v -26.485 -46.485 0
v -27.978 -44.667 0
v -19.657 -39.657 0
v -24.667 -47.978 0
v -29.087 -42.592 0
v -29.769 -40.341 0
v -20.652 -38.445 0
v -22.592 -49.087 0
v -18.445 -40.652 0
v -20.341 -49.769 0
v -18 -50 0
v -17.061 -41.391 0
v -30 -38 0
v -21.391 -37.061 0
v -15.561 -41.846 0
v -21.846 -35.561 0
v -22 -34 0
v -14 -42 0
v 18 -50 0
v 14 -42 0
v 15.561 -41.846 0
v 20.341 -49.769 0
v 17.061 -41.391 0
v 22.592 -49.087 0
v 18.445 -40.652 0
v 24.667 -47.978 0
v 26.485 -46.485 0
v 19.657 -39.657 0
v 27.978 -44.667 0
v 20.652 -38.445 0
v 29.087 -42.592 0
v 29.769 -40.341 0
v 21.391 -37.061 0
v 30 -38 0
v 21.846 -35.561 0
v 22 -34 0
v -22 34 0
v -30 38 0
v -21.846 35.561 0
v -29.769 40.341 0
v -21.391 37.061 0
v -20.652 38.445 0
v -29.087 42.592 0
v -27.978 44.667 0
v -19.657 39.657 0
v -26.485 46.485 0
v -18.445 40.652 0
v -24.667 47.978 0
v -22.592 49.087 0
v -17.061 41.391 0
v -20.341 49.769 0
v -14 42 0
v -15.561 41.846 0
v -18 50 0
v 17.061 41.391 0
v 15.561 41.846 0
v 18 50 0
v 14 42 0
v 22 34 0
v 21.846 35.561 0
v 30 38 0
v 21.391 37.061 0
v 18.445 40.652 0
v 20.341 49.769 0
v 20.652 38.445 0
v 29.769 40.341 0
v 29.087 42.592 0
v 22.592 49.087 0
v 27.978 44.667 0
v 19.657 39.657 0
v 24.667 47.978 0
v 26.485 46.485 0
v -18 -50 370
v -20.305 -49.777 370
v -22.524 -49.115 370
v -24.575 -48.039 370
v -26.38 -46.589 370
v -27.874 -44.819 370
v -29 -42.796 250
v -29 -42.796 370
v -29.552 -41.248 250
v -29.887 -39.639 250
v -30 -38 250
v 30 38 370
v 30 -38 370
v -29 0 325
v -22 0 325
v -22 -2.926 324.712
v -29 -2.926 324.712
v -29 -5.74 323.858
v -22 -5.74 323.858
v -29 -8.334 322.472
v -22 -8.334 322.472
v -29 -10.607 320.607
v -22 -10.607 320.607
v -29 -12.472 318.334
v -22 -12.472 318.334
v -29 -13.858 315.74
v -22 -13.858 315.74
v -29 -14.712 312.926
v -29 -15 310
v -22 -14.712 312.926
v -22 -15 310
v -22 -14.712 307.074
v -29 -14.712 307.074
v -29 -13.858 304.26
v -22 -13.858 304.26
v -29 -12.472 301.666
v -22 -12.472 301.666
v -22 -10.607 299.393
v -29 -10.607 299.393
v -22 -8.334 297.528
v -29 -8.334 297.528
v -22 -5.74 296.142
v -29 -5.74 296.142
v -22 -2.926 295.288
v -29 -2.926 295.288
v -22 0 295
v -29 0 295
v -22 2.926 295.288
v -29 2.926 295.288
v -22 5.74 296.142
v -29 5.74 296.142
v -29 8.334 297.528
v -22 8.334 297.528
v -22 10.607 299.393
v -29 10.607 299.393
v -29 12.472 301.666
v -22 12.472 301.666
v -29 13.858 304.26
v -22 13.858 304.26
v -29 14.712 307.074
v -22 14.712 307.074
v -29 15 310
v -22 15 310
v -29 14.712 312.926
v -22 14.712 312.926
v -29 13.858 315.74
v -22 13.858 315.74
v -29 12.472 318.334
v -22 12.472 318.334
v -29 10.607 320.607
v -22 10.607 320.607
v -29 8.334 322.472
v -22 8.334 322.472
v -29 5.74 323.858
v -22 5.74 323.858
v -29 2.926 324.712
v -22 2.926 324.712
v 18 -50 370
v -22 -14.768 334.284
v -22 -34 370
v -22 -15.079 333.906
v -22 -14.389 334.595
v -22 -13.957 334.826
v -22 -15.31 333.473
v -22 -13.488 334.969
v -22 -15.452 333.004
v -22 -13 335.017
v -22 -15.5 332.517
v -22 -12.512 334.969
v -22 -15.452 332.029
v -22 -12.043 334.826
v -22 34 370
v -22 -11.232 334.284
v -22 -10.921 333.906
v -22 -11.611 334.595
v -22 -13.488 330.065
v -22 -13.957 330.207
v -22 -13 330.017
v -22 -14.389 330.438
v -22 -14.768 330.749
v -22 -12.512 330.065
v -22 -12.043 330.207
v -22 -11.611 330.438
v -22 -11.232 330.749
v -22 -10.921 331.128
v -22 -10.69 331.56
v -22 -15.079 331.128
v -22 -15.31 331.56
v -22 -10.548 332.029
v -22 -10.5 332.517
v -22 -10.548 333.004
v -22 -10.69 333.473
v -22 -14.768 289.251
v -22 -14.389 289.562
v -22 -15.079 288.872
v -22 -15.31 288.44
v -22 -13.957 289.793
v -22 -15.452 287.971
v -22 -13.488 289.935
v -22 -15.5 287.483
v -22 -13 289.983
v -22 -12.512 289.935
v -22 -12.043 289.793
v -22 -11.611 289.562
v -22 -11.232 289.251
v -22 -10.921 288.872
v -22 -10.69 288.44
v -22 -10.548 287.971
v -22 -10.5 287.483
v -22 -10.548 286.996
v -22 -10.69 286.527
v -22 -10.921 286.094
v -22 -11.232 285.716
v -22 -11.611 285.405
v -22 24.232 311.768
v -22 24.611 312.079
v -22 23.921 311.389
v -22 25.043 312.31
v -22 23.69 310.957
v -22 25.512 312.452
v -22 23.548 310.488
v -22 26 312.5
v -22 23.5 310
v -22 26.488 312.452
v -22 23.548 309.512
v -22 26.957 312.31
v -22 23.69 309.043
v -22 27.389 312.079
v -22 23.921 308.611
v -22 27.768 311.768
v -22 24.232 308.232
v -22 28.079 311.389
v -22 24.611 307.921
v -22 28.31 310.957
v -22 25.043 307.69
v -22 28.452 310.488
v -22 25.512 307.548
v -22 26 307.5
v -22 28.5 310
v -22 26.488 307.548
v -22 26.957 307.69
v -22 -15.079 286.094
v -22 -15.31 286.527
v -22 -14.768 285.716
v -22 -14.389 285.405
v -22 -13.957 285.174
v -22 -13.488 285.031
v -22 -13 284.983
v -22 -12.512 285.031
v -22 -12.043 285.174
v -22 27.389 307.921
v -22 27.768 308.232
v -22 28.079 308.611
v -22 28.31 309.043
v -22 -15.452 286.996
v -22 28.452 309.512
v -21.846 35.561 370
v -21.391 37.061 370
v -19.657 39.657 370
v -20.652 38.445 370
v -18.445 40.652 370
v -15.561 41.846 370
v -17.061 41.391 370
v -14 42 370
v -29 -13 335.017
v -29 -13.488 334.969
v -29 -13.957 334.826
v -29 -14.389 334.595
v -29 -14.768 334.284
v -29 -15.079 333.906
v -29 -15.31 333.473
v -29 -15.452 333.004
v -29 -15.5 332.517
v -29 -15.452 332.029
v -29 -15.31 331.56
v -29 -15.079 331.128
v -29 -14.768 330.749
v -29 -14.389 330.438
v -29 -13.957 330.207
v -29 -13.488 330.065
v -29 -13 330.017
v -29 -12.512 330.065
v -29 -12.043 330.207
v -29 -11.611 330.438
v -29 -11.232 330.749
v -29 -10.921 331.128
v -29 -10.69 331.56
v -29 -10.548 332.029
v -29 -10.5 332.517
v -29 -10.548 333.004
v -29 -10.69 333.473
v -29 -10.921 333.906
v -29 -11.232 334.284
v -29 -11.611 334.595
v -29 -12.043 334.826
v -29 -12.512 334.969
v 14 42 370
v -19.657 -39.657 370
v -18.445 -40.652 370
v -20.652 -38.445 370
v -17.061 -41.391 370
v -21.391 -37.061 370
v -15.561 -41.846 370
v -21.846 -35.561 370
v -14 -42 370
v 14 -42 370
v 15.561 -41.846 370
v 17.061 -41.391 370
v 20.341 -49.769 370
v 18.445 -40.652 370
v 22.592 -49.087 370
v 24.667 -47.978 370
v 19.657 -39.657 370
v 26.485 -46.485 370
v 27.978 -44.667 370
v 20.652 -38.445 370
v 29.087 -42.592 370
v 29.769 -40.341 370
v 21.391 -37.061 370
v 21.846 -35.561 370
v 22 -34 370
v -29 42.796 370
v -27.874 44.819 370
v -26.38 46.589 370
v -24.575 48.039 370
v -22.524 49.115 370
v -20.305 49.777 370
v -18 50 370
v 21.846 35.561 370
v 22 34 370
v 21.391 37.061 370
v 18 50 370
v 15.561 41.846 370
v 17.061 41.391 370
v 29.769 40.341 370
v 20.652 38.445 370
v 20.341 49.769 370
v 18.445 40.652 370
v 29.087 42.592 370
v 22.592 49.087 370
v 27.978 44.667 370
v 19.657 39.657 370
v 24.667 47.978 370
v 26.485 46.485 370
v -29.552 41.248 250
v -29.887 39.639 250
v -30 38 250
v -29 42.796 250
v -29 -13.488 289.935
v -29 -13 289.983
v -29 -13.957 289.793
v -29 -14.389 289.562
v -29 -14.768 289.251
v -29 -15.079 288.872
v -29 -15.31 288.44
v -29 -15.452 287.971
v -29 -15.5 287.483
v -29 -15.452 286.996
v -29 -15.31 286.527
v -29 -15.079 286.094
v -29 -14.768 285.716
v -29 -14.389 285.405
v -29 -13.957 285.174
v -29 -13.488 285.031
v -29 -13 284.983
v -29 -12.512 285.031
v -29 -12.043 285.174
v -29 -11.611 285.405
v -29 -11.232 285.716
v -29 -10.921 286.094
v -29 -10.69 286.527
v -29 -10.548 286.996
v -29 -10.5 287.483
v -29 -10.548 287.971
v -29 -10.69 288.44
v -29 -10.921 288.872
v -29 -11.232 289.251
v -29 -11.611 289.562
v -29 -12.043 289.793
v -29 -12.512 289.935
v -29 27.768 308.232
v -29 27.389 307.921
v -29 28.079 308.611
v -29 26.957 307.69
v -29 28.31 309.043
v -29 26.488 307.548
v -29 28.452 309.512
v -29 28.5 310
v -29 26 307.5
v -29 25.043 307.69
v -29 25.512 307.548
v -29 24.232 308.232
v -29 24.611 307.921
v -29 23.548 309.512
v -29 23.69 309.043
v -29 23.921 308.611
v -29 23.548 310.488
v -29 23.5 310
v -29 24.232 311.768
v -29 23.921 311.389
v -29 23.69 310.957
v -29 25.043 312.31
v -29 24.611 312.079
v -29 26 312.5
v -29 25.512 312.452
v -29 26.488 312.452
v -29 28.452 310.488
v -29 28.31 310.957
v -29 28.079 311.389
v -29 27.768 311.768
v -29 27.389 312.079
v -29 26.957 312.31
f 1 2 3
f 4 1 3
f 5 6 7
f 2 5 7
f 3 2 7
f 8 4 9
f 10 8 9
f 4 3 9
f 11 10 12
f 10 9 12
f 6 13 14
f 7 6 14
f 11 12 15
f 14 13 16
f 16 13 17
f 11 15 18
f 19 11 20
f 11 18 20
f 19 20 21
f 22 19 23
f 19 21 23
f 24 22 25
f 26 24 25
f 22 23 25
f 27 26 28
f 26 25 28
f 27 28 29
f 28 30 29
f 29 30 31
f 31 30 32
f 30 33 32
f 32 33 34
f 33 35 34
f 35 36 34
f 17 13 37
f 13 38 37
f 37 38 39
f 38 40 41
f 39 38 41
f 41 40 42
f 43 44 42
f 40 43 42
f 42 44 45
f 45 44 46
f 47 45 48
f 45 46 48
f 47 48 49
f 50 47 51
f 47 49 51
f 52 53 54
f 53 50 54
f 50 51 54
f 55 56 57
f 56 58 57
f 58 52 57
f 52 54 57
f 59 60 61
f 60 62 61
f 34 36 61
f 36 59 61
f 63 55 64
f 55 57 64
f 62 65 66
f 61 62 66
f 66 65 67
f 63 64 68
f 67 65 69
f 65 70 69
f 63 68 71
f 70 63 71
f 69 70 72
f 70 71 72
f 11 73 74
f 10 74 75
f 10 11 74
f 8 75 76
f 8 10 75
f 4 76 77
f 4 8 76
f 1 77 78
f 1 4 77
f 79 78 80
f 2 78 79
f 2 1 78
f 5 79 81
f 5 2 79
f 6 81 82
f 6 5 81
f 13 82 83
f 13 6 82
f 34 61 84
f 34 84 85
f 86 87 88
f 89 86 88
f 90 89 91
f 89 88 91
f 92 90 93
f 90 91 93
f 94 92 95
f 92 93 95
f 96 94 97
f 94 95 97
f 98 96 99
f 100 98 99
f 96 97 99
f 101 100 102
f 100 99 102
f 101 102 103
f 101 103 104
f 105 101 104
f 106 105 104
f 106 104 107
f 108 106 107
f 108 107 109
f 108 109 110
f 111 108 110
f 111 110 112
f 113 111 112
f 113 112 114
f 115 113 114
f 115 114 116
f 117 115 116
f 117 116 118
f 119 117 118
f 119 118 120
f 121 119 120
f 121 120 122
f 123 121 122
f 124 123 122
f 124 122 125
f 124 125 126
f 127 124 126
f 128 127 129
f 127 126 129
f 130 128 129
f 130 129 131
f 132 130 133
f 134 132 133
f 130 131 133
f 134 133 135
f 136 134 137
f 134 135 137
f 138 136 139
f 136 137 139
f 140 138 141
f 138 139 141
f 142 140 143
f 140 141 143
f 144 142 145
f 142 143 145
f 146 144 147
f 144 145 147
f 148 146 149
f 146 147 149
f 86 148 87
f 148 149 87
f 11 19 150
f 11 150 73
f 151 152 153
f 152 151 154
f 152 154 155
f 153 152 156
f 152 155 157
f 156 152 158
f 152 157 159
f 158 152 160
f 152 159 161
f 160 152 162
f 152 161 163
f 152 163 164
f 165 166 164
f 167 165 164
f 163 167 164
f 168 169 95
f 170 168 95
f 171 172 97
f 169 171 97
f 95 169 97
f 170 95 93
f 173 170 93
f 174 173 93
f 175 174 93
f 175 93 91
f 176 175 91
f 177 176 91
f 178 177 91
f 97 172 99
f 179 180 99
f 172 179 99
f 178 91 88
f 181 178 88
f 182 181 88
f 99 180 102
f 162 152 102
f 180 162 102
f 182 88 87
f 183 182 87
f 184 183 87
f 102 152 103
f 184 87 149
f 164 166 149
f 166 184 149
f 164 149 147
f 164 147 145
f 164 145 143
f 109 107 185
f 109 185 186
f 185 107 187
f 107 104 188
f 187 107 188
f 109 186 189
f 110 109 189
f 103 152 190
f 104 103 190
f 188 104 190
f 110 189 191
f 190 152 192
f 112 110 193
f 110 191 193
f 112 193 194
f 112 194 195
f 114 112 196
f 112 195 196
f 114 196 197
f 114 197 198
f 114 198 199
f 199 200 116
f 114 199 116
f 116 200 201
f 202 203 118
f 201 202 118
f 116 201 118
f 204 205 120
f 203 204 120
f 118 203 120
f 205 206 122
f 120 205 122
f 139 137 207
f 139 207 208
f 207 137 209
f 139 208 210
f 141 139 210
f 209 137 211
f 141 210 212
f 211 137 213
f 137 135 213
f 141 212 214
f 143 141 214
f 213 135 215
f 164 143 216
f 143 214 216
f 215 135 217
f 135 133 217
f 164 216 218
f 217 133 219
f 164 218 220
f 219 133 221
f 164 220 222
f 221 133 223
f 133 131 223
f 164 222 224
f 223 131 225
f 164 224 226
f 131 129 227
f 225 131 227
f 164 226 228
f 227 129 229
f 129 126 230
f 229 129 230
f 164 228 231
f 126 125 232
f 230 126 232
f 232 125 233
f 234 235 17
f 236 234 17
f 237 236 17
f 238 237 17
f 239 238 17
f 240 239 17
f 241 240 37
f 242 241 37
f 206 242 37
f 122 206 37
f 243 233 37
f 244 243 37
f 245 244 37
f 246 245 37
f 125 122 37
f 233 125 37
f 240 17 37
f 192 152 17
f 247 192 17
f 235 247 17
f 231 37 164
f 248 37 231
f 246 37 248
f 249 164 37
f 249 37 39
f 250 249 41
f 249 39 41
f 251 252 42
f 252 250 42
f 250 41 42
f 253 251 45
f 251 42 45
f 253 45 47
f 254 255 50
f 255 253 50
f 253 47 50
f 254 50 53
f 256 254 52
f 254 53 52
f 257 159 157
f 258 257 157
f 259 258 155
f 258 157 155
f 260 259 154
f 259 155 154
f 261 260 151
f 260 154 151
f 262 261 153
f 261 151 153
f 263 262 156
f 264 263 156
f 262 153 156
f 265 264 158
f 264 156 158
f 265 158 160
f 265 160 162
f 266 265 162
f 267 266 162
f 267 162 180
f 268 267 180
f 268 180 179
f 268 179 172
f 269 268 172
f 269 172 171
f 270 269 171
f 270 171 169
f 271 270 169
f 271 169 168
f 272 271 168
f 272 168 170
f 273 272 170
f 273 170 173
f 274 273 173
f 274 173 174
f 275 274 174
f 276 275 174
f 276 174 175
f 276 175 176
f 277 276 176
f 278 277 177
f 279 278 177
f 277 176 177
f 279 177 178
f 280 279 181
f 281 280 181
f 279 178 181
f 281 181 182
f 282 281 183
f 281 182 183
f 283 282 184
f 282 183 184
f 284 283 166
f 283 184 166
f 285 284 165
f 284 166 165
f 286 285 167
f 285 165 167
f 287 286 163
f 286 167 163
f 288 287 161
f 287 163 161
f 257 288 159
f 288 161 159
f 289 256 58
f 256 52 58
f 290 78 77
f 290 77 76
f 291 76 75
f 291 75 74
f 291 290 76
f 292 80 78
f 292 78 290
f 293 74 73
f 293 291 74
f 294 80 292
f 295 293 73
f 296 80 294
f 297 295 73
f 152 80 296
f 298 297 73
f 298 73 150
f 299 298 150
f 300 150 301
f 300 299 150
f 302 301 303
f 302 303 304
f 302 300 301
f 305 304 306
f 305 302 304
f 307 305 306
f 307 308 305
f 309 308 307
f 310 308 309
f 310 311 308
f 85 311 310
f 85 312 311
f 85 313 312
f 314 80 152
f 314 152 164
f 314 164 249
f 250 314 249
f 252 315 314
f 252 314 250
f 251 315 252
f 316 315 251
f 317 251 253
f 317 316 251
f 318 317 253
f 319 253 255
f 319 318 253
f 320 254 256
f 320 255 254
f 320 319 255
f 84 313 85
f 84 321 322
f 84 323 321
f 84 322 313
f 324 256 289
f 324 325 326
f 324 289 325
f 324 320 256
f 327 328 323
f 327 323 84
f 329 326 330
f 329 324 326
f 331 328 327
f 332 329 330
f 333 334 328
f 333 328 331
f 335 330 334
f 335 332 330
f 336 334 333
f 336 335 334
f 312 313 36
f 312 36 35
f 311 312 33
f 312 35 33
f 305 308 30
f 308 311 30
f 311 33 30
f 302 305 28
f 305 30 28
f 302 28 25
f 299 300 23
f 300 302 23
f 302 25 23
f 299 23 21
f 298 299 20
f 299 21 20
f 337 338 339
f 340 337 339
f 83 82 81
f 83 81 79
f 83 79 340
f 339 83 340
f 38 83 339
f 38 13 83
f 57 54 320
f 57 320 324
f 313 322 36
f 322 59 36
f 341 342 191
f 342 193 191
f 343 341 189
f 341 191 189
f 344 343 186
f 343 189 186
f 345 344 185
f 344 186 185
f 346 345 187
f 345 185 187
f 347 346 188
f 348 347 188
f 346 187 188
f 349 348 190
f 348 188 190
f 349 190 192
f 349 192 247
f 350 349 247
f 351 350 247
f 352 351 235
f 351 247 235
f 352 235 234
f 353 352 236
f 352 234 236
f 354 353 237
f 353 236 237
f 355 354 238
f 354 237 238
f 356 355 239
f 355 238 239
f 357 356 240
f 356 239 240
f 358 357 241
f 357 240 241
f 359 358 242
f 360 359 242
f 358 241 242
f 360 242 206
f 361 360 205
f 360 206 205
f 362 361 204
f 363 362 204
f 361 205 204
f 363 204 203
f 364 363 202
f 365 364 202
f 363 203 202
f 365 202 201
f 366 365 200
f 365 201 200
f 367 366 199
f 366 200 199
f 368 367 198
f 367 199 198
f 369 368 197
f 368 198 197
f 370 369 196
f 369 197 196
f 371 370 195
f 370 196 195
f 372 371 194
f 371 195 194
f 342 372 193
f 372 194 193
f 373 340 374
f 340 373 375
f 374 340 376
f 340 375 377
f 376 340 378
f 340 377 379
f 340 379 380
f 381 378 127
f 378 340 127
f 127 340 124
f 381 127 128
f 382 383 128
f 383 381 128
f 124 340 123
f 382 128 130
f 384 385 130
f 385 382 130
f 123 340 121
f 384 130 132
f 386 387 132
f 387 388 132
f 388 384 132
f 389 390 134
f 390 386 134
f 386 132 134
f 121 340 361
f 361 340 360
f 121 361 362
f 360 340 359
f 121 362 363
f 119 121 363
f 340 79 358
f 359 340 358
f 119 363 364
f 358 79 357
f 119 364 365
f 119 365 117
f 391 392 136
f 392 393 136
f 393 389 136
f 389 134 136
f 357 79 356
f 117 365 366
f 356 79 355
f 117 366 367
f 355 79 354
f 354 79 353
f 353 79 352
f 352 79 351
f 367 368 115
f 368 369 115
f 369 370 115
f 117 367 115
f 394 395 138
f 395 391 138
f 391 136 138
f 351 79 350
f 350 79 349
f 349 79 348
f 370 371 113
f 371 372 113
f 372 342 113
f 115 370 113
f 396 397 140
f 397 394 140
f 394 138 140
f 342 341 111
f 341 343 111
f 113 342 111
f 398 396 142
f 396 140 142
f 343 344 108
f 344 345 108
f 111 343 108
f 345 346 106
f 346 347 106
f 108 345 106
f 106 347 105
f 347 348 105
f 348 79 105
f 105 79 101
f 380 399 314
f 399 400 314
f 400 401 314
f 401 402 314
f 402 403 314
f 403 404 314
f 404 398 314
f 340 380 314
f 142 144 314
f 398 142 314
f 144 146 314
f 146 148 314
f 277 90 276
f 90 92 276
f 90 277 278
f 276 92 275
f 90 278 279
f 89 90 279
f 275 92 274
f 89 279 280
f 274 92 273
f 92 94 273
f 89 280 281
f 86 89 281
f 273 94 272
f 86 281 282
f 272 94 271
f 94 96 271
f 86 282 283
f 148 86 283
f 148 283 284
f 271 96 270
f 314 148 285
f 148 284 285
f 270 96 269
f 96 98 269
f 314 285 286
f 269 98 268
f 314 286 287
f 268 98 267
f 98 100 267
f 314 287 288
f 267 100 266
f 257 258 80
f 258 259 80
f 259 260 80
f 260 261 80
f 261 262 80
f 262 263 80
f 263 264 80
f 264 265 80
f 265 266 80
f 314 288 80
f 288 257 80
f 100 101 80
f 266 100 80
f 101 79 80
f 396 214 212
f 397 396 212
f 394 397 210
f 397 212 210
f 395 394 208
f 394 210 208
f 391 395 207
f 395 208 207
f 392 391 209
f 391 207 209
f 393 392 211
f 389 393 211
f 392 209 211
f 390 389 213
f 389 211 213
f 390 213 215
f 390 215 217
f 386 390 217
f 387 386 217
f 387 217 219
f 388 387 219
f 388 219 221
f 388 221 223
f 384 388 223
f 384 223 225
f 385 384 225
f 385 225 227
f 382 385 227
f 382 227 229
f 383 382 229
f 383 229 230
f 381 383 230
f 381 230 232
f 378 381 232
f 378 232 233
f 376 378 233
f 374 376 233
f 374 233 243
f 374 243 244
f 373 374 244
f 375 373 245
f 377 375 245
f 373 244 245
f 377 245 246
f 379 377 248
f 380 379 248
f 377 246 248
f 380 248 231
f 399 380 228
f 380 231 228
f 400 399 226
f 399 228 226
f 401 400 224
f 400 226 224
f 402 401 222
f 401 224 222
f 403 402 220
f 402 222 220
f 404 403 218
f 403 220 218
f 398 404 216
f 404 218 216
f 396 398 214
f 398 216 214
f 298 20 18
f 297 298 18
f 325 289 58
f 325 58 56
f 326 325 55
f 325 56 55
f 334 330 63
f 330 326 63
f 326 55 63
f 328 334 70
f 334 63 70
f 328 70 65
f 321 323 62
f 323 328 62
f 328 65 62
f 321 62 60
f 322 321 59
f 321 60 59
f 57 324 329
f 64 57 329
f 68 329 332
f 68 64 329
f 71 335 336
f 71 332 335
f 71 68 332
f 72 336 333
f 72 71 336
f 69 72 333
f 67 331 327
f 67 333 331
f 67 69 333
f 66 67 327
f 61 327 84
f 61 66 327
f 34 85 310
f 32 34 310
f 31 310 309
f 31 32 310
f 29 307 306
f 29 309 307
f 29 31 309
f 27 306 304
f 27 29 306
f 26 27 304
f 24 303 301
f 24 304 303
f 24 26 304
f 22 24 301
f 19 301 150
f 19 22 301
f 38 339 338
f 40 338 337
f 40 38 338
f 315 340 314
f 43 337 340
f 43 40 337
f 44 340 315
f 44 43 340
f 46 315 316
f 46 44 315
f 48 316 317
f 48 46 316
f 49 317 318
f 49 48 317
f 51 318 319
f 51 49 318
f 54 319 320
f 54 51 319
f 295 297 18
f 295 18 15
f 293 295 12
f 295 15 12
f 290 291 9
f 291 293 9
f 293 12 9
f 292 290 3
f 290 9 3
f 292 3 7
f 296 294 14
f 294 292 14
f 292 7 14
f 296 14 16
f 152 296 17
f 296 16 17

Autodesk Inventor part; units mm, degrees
ref_plane "YZ Plane" through (0, 0, 0) normal (1, 0, 0) x (0, 1, 0)
ref_plane "Startebene" through (0, 0, 0) normal (0, 0, 1) x (1, 0, 0)
ref_plane "Endebene" through (0, 0, 370) normal (0, 0, 1) x (1, 0, 0)
sketch "Skizze" plane through (0, 0, 0) normal (0, 0, 1) x (1, 0, 0)
  line L0 (-30, -38) -> (-30, 38)
  line L1 (-18, 50) -> (18, 50)
  line L2 (30, 38) -> (30, -38)
  line L3 (18, -50) -> (-18, -50)
  arc A0 (-30, -38) -> (-18, -50) centre (-18, -38) ccw
  arc A1 (-18, 50) -> (-30, 38) centre (-18, 38) ccw
  arc A2 (30, 38) -> (18, 50) centre (18, 38) ccw
  arc A3 (18, -50) -> (30, -38) centre (18, -38) ccw
  line L4 (-14, 42) -> (14, 42)
  line L5 (22, 34) -> (22, -34)
  line L6 (14, -42) -> (-14, -42)
  line L7 (-22, -34) -> (-22, 34)
  line L8 (0, 73.4794) -> (0, -73.4794) construction
  line L9 (-45.4794, 0) -> (45.4794, 0) construction
  arc A4 (-22, -34) -> (-14, -42) centre (-14, -34) ccw
  arc A5 (-14, 42) -> (-22, 34) centre (-14, 34) ccw
  arc A6 (22, 34) -> (14, 42) centre (14, 34) ccw
  arc A7 (14, -42) -> (22, -34) centre (14, -34) ccw
  dimension "d7" = 12
  dimension "d10" = 100
  dimension "d11" = 60
  dimension "d12" = 8
  dimension "d15" = 50
  dimension "d16" = 30
  dimension "d19" = 8
  dimension "d20" = 8
extrude "Körper" add sketch "Skizze" along normal up to surface (370 mm away) from surface at 0
sketch "Sketch3" plane through (0, 0, 0) normal (0, 0, 1) x (1, 0, 0)
  line L0 (0, 0) -> (10, 0)
ref_plane "Work Plane3" through (0, 0, 0) normal (0, -1, 0) x (1, 0, 0)
sketch "Sketch4" plane through (0, 0, 0) normal (0, -1, 0) x (1, 0, 0)
  line L0 (-2, 0) -> (12, 0)
  line L1 (-2, 370) -> (12, 370)
  dimension "d18" = 370
sketch "Skizze6" plane through (-30, 38, 0) normal (-1, 0, 0) x (0, 0, 1)
  line L0 (0, -76) -> (0, 0) projected
  line L1 (0, -88) -> (370, -88) projected
  point P0 (0, -38)
  point P1 (310, -38)
  dimension "d30" = 50
  dimension "d31" = 310
hole "Bohrung2" at (-30, 0, 310) direction (1, 0, 0) diameter 30 depth 20 tip angle 118
sketch "Skizze7" plane through (-18, -50, 0) normal (0, -1, 0) x (1, 0, 0)
  line L0 (-12, 0) -> (-12, 370) projected
  line L1 (-12, 370) -> (0, 370) projected
  line L2 (-12, 250) -> (-11, 250)
  line L3 (-11, 250) -> (-11, 370)
  line L4 (-11, 370) -> (-12, 370)
  line L5 (-12, 370) -> (-12, 250)
  point P0 (18, 0)
  dimension "d39" = 120
  dimension "d40" = 1
extrude "Extrusion2" cut sketch "Skizze7" against normal through all
sketch "Skizze9" plane through (-29, -42.7958, 370) normal (-1, 0, 0) x (0, 0, 1)
  circle A0 centre (-60, 42.7958) radius 15 projected
  point P0 (-370, 42.7958)
  point P1 (-60, 68.7958)
  point P2 (-82.5167, 29.7958)
  point P3 (-37.4833, 29.7958)
  dimension "d62" = 26
  dimension "d63" = 0
  dimension "d66" = 360
hole "Bohrung4" at (-29, 26, 310) at (-29, -13, 287.4833) at (-29, -13, 332.5167) direction (1, 0, 0) diameter 5 depth 35 tip angle 118
thread "Gewinde4" size "M6x1" class "6H" standard "ANSI Metric M Profile" full length
thread "Gewinde5" size "M6x1" class "6H" standard "ANSI Metric M Profile" full length
thread "Gewinde6" size "M6x1" class "6H" standard "ANSI Metric M Profile" full length
equation "\"d7\" = G_IR"
equation "\"d10\" = G_H"
equation "\"d11\" = G_W"
equation "\"d12\" = G_T"
equation "\"d15\" = 0.5 * d10"
equation "\"d16\" = 0.5 * d11"
equation "\"d19\" = G_T"
equation "\"d20\" = G_T"
equation "\"d3\" = G_L"
equation "\"G_W\" = 60"
equation "\"G_H\" = 100"
equation "\"G_T\" = 8"
equation "\"G_IR\" = 12"
equation "\"G_L\" = d18"
equation "\"G_OFFSET_START\" = 0"
equation "\"G_OFFSET_END\" = 0"
properties part number "EN 10210-2 - 90 x 50 x 5 - 340" material "Stahl, weich"
